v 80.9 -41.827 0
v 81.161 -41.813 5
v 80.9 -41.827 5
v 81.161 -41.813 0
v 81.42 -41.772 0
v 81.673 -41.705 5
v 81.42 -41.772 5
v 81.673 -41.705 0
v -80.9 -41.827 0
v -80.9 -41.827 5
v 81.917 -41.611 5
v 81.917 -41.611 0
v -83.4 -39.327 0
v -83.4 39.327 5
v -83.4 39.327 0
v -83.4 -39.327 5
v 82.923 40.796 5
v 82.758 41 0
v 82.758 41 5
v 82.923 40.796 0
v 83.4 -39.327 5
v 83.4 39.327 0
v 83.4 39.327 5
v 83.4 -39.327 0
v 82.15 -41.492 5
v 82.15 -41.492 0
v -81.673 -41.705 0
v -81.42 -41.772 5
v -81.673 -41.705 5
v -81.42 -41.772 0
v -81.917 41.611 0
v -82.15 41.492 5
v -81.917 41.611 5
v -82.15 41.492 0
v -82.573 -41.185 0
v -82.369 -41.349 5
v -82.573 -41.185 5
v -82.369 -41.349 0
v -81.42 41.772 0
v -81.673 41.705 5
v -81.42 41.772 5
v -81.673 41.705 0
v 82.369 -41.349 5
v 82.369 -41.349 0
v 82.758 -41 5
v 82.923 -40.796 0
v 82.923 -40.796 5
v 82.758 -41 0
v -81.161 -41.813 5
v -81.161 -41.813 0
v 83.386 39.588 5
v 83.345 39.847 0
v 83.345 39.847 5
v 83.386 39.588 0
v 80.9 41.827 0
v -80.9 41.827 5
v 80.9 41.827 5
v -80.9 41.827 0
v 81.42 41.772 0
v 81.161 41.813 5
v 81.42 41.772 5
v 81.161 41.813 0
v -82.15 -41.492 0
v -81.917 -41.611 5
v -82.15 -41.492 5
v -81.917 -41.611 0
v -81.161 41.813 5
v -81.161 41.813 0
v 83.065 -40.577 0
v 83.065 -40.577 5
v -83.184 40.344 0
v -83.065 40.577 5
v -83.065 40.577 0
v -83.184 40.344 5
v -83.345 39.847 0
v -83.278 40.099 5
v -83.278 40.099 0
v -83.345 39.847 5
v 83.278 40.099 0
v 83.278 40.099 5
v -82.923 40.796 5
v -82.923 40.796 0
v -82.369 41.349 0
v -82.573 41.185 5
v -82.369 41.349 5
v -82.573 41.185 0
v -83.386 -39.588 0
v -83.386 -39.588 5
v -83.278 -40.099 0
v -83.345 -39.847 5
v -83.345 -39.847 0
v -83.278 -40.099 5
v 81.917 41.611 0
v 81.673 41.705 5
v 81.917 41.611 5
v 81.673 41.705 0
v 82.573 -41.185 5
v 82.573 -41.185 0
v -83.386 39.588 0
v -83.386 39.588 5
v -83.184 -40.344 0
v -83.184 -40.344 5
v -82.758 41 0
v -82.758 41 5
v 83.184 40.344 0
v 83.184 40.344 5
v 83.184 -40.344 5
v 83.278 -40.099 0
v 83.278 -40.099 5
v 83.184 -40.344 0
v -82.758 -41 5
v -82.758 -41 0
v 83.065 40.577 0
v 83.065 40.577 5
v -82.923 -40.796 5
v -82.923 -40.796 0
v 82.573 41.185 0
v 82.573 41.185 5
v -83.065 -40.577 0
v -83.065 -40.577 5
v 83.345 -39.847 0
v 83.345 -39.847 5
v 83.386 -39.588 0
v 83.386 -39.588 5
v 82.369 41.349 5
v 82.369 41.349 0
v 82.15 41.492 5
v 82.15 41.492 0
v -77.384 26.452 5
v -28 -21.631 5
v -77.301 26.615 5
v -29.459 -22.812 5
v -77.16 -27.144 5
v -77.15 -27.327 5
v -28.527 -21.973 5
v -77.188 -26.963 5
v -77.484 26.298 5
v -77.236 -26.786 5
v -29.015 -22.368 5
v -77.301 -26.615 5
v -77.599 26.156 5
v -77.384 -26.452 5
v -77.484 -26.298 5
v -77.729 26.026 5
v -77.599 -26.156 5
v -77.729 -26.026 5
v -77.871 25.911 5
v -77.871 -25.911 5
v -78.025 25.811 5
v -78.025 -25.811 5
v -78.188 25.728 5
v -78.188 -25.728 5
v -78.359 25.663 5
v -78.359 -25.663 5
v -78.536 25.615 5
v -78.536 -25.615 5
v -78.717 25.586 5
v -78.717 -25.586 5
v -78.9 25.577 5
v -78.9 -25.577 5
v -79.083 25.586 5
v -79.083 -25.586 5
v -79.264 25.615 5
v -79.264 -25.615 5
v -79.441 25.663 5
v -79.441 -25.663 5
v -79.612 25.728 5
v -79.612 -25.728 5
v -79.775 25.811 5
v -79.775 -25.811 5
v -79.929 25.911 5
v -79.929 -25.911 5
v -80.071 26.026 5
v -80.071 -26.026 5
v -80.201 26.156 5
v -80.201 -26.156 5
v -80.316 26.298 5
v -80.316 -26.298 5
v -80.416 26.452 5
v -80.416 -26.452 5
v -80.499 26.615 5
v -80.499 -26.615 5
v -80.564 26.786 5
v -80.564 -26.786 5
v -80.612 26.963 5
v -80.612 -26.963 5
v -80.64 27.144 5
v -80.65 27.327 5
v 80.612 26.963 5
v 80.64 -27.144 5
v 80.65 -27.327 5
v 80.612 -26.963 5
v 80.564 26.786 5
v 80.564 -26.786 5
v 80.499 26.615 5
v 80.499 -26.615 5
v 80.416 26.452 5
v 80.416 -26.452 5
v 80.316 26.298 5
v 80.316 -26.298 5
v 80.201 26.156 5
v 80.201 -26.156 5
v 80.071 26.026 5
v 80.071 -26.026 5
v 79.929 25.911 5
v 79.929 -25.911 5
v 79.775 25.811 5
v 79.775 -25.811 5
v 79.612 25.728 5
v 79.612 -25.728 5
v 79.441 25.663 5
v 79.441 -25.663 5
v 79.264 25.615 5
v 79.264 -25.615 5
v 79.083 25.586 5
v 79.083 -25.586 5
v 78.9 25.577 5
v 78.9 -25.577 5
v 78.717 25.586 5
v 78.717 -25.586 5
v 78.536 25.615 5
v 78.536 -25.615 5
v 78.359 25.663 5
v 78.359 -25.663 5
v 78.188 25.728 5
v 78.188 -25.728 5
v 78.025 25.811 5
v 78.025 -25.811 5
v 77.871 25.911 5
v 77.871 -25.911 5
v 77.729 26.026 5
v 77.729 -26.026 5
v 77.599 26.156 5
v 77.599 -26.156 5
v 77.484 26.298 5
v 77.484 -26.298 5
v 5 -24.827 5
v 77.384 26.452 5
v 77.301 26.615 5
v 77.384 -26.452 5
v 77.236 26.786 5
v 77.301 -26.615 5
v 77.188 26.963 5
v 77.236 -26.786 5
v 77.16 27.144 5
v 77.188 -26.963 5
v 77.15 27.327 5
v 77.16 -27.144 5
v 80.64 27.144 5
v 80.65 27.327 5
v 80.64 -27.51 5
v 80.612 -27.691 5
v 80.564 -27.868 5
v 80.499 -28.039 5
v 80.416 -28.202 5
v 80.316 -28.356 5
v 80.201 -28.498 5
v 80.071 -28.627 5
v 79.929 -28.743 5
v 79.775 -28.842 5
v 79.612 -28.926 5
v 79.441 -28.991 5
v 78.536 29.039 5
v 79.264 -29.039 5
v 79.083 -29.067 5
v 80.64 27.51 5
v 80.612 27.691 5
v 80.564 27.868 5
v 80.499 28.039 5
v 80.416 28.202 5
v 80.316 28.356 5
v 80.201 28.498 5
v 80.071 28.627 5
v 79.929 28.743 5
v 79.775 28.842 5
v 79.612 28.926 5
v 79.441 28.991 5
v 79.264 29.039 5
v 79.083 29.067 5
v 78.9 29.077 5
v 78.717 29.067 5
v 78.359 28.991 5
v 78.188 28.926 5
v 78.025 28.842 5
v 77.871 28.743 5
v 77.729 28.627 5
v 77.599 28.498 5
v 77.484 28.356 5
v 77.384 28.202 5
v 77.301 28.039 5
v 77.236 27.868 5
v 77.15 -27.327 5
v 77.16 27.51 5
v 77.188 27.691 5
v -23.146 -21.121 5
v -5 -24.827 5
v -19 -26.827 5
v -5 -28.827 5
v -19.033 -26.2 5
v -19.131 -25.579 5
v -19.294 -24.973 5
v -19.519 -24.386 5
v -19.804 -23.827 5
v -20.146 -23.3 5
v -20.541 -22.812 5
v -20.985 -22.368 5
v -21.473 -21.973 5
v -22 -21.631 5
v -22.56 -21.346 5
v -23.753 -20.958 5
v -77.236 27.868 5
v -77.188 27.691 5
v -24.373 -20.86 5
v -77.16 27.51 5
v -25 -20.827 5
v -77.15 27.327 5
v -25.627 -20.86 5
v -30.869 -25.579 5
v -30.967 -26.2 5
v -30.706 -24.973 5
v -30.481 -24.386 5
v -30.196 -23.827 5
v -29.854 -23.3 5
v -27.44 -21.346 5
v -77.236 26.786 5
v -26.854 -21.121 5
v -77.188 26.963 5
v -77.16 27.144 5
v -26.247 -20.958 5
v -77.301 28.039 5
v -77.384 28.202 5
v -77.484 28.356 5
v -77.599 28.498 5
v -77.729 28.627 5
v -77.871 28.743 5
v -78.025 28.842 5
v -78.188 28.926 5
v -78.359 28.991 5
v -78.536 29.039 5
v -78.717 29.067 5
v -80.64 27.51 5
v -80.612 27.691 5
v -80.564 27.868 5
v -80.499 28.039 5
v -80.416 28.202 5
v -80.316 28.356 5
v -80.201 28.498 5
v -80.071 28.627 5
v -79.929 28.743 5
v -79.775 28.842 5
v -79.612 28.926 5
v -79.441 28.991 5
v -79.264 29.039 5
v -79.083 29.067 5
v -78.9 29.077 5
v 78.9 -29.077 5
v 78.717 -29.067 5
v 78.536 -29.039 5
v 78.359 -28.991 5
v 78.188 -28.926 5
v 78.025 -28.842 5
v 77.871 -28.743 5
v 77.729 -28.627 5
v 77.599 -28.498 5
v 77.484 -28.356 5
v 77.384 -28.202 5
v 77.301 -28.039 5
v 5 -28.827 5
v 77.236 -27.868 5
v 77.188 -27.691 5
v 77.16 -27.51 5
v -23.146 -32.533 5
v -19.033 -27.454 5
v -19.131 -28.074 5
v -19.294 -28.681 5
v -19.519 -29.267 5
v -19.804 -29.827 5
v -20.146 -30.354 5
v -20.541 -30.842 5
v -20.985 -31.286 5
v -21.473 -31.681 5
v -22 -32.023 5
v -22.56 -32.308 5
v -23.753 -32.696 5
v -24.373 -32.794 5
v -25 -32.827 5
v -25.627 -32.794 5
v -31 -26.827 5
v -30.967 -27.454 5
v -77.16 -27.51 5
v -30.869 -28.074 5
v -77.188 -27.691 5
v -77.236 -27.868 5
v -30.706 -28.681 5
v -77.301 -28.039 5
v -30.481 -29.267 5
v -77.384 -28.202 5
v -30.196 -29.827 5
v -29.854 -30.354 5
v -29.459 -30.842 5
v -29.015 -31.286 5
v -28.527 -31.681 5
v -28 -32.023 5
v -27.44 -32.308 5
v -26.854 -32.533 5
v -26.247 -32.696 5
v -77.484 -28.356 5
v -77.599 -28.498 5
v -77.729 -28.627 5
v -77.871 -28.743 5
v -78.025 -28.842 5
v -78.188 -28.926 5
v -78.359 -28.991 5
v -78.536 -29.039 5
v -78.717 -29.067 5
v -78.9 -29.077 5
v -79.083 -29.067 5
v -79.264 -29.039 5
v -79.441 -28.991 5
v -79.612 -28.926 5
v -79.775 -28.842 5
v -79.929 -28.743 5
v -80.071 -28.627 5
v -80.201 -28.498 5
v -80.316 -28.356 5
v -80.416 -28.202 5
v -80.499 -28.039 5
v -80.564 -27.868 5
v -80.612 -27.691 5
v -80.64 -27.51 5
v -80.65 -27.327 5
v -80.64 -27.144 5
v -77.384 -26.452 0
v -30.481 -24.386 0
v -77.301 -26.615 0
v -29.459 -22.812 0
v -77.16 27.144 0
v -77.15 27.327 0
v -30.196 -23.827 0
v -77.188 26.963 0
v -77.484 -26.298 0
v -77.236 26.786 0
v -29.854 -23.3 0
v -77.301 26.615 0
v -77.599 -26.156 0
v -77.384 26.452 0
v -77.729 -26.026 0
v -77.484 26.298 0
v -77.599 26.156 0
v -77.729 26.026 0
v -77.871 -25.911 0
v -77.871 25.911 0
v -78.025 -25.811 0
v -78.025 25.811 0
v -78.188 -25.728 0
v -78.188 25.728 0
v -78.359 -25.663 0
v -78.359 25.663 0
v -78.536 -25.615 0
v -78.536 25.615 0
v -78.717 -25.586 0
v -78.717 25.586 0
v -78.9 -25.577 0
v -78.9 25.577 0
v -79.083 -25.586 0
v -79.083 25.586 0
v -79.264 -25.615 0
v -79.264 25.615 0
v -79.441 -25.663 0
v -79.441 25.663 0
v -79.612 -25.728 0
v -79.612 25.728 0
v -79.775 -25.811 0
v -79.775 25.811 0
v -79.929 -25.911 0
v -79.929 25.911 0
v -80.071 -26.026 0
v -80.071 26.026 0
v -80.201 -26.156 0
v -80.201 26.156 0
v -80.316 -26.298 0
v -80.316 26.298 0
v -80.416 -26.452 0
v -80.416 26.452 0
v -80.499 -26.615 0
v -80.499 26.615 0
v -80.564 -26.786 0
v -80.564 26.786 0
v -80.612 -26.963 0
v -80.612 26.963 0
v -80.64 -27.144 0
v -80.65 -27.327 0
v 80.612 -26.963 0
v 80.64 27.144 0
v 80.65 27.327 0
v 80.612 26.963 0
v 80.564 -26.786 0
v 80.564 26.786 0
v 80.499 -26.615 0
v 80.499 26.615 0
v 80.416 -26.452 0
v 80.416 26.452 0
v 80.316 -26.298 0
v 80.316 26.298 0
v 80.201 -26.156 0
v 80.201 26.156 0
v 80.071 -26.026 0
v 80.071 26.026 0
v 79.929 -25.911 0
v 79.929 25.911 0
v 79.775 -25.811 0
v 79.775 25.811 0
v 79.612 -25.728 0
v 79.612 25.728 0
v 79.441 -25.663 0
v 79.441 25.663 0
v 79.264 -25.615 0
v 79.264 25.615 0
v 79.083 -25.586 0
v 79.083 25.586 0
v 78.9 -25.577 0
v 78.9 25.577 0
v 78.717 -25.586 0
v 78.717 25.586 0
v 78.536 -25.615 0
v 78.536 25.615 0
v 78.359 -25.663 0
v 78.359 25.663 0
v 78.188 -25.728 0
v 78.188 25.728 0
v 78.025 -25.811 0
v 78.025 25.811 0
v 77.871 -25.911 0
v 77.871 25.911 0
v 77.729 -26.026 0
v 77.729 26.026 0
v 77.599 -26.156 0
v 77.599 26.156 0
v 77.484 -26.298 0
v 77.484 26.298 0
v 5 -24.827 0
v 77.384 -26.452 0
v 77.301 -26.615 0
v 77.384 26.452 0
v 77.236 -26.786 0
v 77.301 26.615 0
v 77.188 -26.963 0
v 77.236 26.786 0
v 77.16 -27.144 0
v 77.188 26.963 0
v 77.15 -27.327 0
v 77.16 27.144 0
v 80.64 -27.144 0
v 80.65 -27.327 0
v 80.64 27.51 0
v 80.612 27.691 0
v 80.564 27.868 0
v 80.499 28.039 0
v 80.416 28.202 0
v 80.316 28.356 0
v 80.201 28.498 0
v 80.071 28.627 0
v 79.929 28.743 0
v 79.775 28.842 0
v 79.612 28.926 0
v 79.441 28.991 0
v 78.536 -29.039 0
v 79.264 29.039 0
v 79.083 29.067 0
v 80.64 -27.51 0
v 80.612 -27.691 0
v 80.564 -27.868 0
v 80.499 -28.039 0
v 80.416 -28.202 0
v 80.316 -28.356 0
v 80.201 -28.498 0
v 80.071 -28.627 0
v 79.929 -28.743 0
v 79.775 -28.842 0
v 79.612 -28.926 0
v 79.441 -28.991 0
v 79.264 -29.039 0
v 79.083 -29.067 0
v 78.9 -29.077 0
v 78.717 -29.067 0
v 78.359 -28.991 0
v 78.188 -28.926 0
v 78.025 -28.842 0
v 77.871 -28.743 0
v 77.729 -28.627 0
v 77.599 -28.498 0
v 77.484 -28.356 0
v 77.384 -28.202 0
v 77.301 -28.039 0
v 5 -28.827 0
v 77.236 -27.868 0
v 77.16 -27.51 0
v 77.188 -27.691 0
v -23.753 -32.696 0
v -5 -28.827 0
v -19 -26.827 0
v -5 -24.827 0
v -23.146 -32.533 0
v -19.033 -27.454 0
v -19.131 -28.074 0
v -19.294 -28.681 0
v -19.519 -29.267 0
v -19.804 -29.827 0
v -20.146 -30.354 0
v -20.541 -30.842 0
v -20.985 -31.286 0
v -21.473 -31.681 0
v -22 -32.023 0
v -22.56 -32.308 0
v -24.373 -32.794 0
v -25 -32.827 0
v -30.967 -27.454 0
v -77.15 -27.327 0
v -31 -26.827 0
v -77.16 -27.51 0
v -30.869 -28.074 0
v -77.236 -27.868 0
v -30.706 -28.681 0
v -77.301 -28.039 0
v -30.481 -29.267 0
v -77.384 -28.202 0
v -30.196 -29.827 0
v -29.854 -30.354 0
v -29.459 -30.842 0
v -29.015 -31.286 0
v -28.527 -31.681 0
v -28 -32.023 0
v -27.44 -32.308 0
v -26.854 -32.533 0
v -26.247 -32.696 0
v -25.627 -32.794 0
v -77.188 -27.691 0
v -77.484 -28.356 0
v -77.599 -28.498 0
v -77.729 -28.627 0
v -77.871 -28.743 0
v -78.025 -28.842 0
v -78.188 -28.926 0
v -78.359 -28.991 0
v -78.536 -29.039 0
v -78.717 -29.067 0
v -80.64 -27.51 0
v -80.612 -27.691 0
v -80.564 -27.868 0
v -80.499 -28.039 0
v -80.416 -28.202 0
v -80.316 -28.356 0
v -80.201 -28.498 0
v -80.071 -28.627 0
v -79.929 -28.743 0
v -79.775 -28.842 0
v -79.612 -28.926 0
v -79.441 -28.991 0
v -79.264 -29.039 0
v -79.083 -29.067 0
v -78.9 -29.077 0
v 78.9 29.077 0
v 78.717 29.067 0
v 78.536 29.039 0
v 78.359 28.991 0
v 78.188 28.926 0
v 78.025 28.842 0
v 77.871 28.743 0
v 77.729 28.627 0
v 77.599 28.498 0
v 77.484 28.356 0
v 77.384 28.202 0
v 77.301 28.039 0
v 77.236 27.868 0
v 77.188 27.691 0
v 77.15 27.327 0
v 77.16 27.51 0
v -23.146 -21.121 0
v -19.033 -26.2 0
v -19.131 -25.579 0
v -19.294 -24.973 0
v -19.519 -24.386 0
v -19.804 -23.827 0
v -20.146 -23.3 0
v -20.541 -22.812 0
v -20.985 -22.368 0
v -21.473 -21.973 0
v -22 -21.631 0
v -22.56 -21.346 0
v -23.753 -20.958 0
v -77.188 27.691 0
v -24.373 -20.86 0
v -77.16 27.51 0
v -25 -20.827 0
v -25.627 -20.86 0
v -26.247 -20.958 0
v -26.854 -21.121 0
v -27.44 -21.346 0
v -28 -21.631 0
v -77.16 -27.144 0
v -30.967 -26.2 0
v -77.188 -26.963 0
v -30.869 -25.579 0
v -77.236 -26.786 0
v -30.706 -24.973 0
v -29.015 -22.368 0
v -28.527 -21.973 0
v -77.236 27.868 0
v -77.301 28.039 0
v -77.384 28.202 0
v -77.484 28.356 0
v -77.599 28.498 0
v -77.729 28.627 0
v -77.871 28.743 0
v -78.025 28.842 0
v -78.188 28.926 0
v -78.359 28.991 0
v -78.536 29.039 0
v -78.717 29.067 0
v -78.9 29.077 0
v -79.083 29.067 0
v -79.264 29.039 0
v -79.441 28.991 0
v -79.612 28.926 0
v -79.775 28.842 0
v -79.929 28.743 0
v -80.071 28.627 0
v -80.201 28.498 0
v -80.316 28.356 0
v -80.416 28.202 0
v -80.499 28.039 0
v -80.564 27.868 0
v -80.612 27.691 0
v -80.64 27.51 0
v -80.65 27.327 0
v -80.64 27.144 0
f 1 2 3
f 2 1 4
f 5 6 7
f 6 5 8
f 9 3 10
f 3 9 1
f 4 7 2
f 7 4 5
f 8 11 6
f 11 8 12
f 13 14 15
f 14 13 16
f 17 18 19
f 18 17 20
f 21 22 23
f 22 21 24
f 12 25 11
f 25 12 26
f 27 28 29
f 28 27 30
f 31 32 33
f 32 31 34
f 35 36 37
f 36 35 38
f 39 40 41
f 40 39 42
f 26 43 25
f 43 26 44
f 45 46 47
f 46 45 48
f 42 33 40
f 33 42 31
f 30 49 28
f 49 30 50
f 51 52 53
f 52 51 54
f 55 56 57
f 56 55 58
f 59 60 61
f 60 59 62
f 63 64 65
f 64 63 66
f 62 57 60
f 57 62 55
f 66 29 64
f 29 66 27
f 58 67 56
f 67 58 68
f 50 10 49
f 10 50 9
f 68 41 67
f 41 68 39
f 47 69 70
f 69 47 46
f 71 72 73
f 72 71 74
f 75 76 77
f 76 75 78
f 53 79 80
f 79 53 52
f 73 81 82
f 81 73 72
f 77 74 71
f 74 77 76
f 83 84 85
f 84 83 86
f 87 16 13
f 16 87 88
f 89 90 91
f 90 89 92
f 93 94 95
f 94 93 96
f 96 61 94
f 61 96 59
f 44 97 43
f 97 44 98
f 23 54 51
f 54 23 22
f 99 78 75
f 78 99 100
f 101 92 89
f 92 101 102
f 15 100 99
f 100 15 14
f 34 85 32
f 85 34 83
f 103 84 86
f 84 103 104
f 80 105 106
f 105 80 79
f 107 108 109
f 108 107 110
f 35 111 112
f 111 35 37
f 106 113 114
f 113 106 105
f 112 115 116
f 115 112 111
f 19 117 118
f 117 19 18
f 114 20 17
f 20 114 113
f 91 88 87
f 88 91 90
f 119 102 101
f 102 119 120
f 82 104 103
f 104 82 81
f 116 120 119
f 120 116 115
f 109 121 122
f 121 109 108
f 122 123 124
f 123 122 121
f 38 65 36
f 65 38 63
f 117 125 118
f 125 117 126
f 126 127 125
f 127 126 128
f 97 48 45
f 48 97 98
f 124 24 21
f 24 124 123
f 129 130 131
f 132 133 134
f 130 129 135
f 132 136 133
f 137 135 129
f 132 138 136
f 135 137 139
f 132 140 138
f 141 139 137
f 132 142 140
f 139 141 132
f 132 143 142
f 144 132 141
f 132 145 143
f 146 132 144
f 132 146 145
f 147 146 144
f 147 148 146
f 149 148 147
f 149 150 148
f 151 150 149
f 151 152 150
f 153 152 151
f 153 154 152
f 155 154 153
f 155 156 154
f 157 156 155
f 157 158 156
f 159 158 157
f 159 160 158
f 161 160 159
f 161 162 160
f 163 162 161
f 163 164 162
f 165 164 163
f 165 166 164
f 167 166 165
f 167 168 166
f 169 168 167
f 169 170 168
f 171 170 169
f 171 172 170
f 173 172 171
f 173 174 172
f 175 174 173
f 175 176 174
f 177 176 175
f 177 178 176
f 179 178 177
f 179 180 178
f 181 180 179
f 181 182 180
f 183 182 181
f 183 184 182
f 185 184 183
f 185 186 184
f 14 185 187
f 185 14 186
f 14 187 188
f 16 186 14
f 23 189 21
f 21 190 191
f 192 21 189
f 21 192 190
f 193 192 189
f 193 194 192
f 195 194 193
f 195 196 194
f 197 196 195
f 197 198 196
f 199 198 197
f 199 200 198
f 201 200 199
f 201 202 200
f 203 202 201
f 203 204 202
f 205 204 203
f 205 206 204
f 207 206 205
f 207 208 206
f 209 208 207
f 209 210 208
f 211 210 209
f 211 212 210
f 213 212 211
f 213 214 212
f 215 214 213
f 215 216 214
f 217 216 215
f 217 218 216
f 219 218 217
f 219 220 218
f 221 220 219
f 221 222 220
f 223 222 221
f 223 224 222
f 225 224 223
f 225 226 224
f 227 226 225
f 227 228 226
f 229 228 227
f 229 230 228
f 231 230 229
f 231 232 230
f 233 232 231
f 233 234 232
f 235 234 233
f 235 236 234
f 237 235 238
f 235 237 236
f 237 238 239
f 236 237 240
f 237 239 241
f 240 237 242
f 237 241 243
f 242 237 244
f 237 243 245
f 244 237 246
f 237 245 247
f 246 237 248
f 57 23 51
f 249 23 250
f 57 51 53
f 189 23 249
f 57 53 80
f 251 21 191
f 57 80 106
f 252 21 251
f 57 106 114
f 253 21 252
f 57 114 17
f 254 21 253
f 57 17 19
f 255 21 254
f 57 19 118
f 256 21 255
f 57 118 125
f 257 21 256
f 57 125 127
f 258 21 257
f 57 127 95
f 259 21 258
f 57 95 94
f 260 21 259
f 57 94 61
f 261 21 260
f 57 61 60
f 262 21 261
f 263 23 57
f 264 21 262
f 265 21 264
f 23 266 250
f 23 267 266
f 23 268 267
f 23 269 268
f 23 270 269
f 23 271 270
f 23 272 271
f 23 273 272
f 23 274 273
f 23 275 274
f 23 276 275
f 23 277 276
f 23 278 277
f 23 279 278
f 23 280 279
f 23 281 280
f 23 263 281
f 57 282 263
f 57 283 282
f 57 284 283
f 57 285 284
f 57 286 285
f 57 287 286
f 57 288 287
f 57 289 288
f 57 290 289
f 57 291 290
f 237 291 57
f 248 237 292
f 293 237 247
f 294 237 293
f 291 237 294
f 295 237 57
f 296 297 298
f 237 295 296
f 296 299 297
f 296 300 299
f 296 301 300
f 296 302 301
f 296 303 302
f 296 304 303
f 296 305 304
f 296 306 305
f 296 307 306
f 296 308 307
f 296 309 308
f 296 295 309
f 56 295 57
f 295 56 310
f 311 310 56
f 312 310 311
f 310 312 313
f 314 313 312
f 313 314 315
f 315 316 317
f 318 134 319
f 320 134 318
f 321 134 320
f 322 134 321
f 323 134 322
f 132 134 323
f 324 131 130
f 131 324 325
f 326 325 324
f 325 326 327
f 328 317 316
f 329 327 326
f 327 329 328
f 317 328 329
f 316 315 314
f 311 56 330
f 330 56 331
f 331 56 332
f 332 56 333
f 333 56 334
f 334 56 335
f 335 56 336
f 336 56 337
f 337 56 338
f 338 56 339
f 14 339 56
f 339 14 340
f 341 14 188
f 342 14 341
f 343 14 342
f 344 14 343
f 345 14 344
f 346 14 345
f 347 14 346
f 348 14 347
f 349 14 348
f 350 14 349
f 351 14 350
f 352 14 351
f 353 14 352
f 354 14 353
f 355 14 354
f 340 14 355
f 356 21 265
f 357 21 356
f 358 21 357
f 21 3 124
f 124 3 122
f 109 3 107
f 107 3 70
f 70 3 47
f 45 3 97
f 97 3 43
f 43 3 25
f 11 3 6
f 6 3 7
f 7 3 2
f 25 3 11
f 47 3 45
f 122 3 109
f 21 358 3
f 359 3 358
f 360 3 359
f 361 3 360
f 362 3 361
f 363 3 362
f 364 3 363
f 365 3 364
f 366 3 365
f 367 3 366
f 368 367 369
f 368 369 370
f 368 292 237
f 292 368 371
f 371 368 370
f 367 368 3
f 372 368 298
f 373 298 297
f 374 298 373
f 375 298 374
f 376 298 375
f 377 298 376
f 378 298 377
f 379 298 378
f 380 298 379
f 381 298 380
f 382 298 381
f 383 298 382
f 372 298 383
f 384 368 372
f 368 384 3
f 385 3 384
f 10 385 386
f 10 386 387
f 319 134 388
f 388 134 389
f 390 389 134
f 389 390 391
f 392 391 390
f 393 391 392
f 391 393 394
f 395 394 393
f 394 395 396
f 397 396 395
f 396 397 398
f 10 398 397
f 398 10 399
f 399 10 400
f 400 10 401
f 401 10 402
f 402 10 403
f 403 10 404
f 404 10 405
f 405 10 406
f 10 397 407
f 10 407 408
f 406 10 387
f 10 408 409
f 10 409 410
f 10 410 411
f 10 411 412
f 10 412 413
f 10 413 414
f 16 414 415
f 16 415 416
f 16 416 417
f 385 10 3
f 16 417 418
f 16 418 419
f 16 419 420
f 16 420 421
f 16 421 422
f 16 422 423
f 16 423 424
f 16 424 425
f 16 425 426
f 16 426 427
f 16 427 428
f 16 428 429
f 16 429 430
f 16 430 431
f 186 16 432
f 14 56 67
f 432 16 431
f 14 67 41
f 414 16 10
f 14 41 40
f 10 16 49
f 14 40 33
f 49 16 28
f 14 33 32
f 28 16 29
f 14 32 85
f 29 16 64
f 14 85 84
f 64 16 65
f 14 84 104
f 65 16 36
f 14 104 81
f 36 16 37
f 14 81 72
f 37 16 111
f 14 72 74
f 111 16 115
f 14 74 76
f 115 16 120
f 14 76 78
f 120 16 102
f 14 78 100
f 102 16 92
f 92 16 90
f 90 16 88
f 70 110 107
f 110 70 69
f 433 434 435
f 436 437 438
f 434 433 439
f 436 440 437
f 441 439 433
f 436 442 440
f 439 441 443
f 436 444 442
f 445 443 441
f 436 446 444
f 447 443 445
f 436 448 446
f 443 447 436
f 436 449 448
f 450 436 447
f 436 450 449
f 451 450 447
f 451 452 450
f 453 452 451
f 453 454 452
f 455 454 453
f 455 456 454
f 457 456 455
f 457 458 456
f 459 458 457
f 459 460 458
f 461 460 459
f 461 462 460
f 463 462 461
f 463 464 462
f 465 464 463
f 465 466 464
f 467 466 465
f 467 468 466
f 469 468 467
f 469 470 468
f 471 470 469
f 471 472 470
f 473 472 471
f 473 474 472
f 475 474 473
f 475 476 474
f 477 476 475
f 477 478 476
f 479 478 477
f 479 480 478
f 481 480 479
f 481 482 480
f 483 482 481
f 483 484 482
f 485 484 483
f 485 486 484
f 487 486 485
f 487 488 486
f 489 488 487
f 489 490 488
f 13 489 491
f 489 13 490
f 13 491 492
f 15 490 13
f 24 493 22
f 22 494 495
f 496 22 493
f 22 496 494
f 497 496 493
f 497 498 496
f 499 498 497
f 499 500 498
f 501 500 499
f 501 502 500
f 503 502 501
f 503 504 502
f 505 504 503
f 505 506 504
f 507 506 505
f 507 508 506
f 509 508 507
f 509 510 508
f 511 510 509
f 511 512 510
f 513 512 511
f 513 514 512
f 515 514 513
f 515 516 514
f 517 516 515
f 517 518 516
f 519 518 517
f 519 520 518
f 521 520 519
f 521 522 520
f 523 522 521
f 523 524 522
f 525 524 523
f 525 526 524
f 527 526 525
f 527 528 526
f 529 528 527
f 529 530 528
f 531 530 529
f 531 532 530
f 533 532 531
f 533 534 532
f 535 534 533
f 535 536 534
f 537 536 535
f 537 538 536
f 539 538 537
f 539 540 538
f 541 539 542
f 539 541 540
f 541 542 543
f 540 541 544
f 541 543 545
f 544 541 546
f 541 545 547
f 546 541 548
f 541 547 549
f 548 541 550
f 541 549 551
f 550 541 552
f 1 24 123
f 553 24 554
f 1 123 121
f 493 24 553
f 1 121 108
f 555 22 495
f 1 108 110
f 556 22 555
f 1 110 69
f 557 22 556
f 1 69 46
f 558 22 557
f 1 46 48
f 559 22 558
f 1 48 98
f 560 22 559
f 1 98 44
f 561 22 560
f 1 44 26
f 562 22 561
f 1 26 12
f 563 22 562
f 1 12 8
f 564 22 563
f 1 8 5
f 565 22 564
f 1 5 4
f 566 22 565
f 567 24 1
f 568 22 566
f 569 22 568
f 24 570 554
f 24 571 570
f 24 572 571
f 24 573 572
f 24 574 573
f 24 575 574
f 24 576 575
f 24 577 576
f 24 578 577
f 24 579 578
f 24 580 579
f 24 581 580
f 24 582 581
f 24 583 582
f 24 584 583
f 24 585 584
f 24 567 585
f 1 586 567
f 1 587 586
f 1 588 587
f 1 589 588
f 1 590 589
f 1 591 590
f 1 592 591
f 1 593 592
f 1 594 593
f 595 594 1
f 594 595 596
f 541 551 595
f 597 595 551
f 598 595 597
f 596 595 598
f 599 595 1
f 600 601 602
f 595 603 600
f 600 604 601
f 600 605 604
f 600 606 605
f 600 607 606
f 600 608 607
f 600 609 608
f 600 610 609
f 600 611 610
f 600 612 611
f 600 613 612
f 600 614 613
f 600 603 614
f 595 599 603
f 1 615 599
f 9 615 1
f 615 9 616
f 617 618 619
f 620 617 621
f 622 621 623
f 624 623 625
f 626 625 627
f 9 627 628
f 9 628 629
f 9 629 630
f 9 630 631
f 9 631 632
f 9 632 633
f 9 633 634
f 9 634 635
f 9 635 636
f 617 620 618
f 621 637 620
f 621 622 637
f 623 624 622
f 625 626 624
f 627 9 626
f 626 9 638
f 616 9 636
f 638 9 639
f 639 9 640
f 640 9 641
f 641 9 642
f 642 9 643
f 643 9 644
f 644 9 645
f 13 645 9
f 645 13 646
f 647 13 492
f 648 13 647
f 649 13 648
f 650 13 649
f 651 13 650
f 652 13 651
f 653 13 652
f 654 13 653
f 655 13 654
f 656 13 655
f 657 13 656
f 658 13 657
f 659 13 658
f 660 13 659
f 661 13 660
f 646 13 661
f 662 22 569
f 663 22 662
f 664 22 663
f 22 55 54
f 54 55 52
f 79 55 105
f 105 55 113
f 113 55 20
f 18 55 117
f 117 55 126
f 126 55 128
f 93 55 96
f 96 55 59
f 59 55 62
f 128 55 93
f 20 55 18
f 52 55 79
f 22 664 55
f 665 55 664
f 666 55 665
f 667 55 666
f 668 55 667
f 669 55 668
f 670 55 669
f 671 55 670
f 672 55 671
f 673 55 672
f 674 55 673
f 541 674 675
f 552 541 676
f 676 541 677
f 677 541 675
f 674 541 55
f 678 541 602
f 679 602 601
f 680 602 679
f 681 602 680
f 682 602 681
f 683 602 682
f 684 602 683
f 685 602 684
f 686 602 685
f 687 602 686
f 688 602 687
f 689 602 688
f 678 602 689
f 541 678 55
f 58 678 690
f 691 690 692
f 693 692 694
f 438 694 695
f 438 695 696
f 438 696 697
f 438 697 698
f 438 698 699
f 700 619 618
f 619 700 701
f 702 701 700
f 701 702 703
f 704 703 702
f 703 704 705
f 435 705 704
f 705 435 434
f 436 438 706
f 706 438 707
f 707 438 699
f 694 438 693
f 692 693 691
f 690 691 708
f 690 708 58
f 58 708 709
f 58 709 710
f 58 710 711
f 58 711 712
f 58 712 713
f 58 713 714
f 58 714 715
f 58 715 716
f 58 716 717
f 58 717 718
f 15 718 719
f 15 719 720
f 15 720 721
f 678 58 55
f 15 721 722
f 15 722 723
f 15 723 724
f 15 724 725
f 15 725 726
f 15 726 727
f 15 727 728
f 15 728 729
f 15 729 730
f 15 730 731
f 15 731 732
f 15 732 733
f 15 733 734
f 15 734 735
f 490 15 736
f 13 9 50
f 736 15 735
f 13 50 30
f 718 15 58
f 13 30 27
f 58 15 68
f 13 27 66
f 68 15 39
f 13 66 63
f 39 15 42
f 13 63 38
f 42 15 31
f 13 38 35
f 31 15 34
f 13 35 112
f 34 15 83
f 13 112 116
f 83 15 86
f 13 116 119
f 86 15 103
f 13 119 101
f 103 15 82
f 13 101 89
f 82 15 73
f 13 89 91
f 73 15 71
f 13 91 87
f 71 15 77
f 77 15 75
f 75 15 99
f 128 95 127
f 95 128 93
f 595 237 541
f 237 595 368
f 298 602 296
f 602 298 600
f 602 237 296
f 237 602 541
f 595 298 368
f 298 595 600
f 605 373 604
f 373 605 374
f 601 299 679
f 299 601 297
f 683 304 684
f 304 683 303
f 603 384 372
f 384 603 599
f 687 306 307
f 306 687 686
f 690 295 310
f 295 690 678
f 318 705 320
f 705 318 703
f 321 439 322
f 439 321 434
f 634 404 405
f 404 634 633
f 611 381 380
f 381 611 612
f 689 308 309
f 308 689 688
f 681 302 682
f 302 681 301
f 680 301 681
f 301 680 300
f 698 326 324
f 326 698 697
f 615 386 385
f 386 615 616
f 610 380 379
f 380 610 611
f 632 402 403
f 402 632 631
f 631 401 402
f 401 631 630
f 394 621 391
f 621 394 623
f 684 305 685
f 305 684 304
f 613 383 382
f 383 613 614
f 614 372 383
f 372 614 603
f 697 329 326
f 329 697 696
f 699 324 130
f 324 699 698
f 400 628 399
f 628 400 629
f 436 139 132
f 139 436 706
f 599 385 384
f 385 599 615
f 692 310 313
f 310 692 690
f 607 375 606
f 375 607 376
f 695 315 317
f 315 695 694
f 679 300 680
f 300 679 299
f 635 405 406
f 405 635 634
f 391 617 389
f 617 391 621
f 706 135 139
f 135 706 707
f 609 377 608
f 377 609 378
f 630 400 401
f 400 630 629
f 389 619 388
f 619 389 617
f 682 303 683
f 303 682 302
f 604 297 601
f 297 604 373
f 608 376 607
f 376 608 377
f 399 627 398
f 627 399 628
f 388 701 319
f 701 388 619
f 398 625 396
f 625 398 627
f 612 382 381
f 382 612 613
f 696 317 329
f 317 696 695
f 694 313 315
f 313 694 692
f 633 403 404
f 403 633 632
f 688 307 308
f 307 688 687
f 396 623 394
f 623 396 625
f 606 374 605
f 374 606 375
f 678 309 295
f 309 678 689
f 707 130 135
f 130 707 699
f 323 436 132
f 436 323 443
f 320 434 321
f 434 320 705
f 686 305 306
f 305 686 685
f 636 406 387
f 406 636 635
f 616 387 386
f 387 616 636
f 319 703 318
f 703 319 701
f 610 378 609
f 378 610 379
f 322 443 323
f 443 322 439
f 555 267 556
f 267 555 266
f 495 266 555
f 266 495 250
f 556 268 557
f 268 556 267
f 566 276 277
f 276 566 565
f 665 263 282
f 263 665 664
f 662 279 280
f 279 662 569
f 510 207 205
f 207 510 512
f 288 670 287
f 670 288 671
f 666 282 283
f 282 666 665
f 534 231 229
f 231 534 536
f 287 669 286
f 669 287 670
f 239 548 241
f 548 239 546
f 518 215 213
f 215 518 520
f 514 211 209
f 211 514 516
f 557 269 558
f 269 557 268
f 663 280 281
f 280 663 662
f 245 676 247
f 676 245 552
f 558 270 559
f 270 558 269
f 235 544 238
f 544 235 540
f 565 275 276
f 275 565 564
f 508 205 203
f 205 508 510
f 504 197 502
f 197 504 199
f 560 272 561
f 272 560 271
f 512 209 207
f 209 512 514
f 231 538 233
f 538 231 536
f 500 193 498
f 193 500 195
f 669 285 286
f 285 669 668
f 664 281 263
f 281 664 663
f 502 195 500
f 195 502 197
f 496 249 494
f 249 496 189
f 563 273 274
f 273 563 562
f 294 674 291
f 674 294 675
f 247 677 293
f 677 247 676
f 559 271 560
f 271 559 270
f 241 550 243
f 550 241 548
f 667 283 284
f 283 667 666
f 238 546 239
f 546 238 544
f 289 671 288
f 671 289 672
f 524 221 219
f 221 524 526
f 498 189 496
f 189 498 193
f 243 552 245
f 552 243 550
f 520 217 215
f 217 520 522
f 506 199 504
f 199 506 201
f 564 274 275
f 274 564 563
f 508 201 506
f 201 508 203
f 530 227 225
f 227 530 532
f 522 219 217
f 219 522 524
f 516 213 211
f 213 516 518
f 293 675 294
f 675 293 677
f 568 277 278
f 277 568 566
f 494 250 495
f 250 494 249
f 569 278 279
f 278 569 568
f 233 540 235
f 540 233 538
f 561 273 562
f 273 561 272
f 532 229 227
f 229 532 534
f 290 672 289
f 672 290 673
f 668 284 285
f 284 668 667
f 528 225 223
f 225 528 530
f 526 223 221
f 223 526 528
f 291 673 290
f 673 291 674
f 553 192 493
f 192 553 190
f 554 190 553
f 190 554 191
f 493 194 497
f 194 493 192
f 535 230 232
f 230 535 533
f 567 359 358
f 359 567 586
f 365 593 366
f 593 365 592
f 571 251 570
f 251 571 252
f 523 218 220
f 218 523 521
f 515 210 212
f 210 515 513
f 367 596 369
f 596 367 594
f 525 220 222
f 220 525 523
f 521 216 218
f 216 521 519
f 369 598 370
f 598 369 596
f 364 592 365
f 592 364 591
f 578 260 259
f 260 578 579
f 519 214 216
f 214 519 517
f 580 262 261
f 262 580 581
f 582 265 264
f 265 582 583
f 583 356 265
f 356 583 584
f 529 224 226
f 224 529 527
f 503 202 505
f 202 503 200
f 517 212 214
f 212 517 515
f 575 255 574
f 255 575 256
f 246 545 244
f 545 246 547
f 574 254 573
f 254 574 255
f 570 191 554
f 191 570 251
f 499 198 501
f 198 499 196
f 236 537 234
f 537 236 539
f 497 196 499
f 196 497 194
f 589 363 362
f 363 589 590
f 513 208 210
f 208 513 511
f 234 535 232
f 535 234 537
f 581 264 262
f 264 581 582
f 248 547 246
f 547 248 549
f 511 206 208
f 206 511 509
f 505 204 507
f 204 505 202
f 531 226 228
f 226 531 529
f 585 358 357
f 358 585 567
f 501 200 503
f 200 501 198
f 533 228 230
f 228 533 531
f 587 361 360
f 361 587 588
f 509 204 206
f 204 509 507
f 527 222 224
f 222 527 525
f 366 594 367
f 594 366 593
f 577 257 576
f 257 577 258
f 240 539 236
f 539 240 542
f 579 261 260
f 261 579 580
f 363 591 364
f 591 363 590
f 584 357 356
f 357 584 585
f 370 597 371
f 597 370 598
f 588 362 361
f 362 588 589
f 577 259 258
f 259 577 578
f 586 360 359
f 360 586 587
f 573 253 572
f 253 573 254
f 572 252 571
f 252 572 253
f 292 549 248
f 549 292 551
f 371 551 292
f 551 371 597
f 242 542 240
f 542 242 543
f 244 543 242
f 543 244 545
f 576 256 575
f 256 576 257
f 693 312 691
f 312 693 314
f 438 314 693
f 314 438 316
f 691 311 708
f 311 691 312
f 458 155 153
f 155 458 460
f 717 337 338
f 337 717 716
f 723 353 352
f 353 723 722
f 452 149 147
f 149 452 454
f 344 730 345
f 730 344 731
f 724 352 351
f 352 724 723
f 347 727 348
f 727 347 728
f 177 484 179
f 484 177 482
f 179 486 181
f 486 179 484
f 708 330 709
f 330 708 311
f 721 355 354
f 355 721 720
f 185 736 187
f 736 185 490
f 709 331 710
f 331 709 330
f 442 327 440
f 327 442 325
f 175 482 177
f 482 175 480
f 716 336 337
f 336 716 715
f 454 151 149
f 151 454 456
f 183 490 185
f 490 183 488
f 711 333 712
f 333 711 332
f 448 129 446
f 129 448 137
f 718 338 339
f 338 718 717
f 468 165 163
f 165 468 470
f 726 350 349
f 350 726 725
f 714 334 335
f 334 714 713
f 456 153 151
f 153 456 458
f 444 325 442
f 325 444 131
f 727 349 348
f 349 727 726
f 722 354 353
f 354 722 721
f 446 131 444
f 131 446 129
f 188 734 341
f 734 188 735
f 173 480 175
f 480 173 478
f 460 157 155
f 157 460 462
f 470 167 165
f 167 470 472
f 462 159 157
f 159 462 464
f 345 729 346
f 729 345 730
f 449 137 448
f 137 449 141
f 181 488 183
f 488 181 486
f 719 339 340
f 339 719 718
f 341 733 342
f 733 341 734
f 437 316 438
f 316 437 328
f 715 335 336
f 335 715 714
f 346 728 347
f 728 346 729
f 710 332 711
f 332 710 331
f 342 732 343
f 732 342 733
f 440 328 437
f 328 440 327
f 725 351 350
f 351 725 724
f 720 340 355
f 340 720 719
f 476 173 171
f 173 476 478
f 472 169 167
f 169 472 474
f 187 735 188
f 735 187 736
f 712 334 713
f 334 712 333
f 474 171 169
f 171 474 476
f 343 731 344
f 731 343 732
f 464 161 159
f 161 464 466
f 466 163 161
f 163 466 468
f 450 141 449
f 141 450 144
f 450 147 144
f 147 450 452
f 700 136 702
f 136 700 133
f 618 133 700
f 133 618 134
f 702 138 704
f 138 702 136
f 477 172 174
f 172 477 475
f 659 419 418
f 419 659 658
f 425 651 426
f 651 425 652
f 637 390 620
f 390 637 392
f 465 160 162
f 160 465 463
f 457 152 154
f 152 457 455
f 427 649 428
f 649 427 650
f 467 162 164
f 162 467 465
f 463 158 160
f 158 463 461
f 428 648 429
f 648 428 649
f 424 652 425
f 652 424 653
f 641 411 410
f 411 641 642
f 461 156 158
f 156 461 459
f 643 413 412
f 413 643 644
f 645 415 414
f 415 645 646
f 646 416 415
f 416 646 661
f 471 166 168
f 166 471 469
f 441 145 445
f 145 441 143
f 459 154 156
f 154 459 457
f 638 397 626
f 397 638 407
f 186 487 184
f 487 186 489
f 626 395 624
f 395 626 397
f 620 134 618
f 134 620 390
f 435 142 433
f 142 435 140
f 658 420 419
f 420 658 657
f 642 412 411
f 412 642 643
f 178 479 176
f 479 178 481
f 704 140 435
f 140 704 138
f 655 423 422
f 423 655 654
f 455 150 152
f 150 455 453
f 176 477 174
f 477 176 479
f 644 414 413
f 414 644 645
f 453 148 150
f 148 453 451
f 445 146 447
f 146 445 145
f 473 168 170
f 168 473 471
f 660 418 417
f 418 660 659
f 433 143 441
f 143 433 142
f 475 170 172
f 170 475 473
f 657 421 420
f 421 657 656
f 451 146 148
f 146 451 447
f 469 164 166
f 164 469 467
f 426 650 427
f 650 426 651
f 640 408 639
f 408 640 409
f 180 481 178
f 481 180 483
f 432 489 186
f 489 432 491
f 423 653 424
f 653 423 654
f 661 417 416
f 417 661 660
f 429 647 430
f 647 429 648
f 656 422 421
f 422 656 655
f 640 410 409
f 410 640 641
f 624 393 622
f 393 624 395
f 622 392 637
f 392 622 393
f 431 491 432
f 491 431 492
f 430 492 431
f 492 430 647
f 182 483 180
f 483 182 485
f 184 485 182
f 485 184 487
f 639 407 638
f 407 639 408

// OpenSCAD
// ChromaCade Synthesizer - Back Panel
$fn = 60;

// --- Global Dimensions ---
in2mm = 25.4;
case_w = 7    * in2mm;
case_d = 4.5  * in2mm;
wall   = 5;

front_h = 1.75 * in2mm;
shelf_d = 1.5  * in2mm;
shelf_a = 8;
panel_l = 2.5  * in2mm;
panel_a = 45;

p3_z = front_h + shelf_d*sin(shelf_a);
case_h = p3_z + panel_l*sin(panel_a);

boss_x     = case_w/2 - wall - 5;
boss_z_top = case_h - wall - 15;
boss_z_bot = wall + 15;

// --- Back Panel ---
w = case_w - wall*2 - 1;
h = case_h - wall*2 - 1;

difference() {
    linear_extrude(wall)
    offset(r=2.5) offset(r=-2.5) square([w, h], center=true);

    translate([0, -h/2 + 15, -1]) cube([10, 4, wall*3], center=true);
    translate([-25, -h/2 + 15, -1]) cylinder(h=wall*3, d=12, center=false);

    translate([ boss_x, boss_z_top - case_h/2, -1]) cylinder(h=wall*3, d=3.5, center=false);
    translate([ boss_x, boss_z_bot - case_h/2, -1]) cylinder(h=wall*3, d=3.5, center=false);
    translate([-boss_x, boss_z_top - case_h/2, -1]) cylinder(h=wall*3, d=3.5, center=false);
    translate([-boss_x, boss_z_bot - case_h/2, -1]) cylinder(h=wall*3, d=3.5, center=false);
}
